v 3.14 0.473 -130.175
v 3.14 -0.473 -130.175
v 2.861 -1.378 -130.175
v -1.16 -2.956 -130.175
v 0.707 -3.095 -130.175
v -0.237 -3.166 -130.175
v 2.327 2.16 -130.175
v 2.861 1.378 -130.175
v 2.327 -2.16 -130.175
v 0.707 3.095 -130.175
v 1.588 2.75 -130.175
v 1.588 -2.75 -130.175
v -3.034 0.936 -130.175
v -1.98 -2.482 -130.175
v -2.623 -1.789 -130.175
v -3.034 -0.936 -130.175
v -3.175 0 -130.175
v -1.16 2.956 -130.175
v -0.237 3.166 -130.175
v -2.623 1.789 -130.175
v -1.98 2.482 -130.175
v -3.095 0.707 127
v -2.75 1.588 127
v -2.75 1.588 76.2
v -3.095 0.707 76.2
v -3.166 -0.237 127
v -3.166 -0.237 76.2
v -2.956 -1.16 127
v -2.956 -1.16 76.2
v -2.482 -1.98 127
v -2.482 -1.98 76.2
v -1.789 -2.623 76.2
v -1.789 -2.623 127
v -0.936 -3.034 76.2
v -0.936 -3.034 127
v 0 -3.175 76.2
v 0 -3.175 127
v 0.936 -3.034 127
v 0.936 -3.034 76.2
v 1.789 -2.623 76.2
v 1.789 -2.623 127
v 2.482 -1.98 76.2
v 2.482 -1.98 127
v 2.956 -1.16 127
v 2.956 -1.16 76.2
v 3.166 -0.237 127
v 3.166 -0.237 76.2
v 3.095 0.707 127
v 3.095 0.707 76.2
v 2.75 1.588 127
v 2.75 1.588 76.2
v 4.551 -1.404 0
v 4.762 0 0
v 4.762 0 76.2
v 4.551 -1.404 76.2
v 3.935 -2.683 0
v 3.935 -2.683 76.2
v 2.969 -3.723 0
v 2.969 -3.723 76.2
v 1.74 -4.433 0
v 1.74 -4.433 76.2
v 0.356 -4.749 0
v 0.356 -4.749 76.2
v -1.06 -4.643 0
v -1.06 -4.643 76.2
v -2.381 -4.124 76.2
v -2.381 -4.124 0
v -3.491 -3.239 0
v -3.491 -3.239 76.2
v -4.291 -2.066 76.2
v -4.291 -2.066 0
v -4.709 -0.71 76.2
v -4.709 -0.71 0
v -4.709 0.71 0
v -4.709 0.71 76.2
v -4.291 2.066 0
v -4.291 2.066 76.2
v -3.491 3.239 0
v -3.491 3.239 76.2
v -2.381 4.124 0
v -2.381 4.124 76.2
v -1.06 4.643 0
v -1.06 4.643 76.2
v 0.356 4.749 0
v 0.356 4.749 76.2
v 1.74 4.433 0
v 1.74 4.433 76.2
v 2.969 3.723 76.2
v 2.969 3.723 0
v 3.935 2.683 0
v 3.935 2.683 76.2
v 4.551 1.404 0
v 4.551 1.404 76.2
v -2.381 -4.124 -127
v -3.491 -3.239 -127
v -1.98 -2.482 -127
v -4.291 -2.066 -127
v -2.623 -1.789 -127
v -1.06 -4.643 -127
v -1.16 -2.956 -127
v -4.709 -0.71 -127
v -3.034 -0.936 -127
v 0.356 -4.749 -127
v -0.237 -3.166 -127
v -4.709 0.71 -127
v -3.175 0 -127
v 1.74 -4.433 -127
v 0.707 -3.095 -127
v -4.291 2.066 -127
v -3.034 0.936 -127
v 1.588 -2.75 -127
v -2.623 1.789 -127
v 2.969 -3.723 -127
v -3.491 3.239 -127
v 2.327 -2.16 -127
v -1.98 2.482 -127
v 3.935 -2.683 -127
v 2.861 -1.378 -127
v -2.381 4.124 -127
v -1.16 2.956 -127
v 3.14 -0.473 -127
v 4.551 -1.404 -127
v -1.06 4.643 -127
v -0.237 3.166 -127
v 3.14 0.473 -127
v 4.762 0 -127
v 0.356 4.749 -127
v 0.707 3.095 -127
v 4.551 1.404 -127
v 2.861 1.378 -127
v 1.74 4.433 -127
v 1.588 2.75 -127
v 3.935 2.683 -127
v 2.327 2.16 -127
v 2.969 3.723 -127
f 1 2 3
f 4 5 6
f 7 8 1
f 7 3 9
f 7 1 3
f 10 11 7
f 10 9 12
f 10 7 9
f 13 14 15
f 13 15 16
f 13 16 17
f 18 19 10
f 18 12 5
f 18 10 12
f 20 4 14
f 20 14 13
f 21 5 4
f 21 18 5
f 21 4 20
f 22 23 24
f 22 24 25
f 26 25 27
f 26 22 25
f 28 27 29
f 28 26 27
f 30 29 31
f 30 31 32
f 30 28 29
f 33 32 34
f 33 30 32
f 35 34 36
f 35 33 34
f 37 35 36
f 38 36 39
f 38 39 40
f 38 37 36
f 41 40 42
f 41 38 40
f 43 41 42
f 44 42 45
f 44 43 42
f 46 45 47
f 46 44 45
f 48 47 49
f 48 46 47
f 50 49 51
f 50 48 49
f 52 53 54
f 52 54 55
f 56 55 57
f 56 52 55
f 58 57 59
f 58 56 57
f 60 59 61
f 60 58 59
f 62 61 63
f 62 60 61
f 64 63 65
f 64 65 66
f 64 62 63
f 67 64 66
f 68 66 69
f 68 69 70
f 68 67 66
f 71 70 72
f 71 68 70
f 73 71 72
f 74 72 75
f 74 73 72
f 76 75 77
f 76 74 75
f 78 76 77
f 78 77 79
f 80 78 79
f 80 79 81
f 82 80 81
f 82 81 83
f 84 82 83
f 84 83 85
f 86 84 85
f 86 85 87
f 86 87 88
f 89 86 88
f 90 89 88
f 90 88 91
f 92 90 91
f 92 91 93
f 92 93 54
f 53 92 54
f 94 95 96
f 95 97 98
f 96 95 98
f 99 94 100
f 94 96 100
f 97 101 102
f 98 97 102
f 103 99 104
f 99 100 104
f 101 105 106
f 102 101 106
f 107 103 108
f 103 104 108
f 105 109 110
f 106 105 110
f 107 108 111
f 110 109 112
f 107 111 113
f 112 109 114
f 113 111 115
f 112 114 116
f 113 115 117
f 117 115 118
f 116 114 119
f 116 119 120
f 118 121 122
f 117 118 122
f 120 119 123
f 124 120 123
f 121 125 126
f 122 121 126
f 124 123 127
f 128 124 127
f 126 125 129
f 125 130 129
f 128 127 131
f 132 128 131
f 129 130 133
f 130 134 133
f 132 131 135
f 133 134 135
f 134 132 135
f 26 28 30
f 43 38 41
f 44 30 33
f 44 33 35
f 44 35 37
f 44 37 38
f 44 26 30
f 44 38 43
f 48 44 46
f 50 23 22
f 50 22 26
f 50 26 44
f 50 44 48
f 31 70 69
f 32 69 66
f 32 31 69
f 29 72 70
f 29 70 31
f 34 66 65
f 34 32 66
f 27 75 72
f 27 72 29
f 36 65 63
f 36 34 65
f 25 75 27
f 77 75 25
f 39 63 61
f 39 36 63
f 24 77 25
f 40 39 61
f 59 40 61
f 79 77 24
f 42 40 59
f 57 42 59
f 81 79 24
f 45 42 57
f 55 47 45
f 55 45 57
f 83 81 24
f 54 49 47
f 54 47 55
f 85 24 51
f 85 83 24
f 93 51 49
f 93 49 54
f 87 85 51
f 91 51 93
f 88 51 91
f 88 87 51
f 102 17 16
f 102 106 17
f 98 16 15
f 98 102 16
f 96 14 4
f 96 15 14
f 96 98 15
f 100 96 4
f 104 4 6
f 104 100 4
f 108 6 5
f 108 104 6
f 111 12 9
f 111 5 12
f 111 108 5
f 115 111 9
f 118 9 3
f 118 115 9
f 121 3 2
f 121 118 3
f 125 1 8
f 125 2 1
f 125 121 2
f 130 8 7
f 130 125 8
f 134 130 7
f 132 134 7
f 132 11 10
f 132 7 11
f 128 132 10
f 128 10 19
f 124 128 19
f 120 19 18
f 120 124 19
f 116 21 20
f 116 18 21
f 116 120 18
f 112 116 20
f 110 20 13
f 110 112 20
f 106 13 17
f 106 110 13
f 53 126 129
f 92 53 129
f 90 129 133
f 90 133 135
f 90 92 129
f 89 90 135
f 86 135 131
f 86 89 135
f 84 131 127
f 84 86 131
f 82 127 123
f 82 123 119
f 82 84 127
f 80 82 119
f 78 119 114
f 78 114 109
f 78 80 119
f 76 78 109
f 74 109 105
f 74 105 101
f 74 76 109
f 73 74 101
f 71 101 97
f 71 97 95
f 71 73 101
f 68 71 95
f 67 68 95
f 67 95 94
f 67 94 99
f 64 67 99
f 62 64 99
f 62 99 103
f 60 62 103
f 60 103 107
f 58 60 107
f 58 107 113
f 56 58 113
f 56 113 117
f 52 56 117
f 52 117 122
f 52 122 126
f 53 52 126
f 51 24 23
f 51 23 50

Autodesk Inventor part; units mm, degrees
ref_plane "YZ Plane" through (0, 0, 0) normal (1, 0, 0) x (0, 1, 0)
ref_plane "XZ Plane" through (0, 0, 0) normal (0, 1, 0) x (-1, 0, 0)
ref_plane "XY Plane" through (0, 0, 0) normal (0, 0, 1) x (1, 0, 0)
sketch "Sketch1" plane through (0, 0, 0) normal (0, 0, 1) x (1, 0, 0)
  circle A0 centre (0, 0) radius 4.7625
  dimension "d0" = 9.525
extrude "Extrusion1" add sketch "Sketch1" along normal mid plane 254
thread "Thread1" size "3/8-16 UNC" class "2A" standard "ANSI Unified Screw Threads" full length
sketch "Sketch2" plane through (0, 0, 127) normal (0, 0, 1) x (1, 0, 0)
  arc A0 (-2.7496, 1.5875) -> (2.7496, 1.5875) centre (0, 0) ccw
  line L0 (-2.7496, 1.5875) -> (2.7496, 1.5875)
  circle A1 centre (0, 0) radius 8.1081
  dimension "d5" = 6.35
  dimension "d6" = 1.5875
extrude "Extrusion2" cut sketch "Sketch2" against normal blind 50.8
sketch "Sketch4" plane through (0, 0, -127) normal (0, 0, -1) x (-1, 0, 0)
  circle A0 centre (0, 0) radius 3.175
  dimension "d16" = 6.35
extrude "Extrusion3" add sketch "Sketch4" along normal blind 3.175
